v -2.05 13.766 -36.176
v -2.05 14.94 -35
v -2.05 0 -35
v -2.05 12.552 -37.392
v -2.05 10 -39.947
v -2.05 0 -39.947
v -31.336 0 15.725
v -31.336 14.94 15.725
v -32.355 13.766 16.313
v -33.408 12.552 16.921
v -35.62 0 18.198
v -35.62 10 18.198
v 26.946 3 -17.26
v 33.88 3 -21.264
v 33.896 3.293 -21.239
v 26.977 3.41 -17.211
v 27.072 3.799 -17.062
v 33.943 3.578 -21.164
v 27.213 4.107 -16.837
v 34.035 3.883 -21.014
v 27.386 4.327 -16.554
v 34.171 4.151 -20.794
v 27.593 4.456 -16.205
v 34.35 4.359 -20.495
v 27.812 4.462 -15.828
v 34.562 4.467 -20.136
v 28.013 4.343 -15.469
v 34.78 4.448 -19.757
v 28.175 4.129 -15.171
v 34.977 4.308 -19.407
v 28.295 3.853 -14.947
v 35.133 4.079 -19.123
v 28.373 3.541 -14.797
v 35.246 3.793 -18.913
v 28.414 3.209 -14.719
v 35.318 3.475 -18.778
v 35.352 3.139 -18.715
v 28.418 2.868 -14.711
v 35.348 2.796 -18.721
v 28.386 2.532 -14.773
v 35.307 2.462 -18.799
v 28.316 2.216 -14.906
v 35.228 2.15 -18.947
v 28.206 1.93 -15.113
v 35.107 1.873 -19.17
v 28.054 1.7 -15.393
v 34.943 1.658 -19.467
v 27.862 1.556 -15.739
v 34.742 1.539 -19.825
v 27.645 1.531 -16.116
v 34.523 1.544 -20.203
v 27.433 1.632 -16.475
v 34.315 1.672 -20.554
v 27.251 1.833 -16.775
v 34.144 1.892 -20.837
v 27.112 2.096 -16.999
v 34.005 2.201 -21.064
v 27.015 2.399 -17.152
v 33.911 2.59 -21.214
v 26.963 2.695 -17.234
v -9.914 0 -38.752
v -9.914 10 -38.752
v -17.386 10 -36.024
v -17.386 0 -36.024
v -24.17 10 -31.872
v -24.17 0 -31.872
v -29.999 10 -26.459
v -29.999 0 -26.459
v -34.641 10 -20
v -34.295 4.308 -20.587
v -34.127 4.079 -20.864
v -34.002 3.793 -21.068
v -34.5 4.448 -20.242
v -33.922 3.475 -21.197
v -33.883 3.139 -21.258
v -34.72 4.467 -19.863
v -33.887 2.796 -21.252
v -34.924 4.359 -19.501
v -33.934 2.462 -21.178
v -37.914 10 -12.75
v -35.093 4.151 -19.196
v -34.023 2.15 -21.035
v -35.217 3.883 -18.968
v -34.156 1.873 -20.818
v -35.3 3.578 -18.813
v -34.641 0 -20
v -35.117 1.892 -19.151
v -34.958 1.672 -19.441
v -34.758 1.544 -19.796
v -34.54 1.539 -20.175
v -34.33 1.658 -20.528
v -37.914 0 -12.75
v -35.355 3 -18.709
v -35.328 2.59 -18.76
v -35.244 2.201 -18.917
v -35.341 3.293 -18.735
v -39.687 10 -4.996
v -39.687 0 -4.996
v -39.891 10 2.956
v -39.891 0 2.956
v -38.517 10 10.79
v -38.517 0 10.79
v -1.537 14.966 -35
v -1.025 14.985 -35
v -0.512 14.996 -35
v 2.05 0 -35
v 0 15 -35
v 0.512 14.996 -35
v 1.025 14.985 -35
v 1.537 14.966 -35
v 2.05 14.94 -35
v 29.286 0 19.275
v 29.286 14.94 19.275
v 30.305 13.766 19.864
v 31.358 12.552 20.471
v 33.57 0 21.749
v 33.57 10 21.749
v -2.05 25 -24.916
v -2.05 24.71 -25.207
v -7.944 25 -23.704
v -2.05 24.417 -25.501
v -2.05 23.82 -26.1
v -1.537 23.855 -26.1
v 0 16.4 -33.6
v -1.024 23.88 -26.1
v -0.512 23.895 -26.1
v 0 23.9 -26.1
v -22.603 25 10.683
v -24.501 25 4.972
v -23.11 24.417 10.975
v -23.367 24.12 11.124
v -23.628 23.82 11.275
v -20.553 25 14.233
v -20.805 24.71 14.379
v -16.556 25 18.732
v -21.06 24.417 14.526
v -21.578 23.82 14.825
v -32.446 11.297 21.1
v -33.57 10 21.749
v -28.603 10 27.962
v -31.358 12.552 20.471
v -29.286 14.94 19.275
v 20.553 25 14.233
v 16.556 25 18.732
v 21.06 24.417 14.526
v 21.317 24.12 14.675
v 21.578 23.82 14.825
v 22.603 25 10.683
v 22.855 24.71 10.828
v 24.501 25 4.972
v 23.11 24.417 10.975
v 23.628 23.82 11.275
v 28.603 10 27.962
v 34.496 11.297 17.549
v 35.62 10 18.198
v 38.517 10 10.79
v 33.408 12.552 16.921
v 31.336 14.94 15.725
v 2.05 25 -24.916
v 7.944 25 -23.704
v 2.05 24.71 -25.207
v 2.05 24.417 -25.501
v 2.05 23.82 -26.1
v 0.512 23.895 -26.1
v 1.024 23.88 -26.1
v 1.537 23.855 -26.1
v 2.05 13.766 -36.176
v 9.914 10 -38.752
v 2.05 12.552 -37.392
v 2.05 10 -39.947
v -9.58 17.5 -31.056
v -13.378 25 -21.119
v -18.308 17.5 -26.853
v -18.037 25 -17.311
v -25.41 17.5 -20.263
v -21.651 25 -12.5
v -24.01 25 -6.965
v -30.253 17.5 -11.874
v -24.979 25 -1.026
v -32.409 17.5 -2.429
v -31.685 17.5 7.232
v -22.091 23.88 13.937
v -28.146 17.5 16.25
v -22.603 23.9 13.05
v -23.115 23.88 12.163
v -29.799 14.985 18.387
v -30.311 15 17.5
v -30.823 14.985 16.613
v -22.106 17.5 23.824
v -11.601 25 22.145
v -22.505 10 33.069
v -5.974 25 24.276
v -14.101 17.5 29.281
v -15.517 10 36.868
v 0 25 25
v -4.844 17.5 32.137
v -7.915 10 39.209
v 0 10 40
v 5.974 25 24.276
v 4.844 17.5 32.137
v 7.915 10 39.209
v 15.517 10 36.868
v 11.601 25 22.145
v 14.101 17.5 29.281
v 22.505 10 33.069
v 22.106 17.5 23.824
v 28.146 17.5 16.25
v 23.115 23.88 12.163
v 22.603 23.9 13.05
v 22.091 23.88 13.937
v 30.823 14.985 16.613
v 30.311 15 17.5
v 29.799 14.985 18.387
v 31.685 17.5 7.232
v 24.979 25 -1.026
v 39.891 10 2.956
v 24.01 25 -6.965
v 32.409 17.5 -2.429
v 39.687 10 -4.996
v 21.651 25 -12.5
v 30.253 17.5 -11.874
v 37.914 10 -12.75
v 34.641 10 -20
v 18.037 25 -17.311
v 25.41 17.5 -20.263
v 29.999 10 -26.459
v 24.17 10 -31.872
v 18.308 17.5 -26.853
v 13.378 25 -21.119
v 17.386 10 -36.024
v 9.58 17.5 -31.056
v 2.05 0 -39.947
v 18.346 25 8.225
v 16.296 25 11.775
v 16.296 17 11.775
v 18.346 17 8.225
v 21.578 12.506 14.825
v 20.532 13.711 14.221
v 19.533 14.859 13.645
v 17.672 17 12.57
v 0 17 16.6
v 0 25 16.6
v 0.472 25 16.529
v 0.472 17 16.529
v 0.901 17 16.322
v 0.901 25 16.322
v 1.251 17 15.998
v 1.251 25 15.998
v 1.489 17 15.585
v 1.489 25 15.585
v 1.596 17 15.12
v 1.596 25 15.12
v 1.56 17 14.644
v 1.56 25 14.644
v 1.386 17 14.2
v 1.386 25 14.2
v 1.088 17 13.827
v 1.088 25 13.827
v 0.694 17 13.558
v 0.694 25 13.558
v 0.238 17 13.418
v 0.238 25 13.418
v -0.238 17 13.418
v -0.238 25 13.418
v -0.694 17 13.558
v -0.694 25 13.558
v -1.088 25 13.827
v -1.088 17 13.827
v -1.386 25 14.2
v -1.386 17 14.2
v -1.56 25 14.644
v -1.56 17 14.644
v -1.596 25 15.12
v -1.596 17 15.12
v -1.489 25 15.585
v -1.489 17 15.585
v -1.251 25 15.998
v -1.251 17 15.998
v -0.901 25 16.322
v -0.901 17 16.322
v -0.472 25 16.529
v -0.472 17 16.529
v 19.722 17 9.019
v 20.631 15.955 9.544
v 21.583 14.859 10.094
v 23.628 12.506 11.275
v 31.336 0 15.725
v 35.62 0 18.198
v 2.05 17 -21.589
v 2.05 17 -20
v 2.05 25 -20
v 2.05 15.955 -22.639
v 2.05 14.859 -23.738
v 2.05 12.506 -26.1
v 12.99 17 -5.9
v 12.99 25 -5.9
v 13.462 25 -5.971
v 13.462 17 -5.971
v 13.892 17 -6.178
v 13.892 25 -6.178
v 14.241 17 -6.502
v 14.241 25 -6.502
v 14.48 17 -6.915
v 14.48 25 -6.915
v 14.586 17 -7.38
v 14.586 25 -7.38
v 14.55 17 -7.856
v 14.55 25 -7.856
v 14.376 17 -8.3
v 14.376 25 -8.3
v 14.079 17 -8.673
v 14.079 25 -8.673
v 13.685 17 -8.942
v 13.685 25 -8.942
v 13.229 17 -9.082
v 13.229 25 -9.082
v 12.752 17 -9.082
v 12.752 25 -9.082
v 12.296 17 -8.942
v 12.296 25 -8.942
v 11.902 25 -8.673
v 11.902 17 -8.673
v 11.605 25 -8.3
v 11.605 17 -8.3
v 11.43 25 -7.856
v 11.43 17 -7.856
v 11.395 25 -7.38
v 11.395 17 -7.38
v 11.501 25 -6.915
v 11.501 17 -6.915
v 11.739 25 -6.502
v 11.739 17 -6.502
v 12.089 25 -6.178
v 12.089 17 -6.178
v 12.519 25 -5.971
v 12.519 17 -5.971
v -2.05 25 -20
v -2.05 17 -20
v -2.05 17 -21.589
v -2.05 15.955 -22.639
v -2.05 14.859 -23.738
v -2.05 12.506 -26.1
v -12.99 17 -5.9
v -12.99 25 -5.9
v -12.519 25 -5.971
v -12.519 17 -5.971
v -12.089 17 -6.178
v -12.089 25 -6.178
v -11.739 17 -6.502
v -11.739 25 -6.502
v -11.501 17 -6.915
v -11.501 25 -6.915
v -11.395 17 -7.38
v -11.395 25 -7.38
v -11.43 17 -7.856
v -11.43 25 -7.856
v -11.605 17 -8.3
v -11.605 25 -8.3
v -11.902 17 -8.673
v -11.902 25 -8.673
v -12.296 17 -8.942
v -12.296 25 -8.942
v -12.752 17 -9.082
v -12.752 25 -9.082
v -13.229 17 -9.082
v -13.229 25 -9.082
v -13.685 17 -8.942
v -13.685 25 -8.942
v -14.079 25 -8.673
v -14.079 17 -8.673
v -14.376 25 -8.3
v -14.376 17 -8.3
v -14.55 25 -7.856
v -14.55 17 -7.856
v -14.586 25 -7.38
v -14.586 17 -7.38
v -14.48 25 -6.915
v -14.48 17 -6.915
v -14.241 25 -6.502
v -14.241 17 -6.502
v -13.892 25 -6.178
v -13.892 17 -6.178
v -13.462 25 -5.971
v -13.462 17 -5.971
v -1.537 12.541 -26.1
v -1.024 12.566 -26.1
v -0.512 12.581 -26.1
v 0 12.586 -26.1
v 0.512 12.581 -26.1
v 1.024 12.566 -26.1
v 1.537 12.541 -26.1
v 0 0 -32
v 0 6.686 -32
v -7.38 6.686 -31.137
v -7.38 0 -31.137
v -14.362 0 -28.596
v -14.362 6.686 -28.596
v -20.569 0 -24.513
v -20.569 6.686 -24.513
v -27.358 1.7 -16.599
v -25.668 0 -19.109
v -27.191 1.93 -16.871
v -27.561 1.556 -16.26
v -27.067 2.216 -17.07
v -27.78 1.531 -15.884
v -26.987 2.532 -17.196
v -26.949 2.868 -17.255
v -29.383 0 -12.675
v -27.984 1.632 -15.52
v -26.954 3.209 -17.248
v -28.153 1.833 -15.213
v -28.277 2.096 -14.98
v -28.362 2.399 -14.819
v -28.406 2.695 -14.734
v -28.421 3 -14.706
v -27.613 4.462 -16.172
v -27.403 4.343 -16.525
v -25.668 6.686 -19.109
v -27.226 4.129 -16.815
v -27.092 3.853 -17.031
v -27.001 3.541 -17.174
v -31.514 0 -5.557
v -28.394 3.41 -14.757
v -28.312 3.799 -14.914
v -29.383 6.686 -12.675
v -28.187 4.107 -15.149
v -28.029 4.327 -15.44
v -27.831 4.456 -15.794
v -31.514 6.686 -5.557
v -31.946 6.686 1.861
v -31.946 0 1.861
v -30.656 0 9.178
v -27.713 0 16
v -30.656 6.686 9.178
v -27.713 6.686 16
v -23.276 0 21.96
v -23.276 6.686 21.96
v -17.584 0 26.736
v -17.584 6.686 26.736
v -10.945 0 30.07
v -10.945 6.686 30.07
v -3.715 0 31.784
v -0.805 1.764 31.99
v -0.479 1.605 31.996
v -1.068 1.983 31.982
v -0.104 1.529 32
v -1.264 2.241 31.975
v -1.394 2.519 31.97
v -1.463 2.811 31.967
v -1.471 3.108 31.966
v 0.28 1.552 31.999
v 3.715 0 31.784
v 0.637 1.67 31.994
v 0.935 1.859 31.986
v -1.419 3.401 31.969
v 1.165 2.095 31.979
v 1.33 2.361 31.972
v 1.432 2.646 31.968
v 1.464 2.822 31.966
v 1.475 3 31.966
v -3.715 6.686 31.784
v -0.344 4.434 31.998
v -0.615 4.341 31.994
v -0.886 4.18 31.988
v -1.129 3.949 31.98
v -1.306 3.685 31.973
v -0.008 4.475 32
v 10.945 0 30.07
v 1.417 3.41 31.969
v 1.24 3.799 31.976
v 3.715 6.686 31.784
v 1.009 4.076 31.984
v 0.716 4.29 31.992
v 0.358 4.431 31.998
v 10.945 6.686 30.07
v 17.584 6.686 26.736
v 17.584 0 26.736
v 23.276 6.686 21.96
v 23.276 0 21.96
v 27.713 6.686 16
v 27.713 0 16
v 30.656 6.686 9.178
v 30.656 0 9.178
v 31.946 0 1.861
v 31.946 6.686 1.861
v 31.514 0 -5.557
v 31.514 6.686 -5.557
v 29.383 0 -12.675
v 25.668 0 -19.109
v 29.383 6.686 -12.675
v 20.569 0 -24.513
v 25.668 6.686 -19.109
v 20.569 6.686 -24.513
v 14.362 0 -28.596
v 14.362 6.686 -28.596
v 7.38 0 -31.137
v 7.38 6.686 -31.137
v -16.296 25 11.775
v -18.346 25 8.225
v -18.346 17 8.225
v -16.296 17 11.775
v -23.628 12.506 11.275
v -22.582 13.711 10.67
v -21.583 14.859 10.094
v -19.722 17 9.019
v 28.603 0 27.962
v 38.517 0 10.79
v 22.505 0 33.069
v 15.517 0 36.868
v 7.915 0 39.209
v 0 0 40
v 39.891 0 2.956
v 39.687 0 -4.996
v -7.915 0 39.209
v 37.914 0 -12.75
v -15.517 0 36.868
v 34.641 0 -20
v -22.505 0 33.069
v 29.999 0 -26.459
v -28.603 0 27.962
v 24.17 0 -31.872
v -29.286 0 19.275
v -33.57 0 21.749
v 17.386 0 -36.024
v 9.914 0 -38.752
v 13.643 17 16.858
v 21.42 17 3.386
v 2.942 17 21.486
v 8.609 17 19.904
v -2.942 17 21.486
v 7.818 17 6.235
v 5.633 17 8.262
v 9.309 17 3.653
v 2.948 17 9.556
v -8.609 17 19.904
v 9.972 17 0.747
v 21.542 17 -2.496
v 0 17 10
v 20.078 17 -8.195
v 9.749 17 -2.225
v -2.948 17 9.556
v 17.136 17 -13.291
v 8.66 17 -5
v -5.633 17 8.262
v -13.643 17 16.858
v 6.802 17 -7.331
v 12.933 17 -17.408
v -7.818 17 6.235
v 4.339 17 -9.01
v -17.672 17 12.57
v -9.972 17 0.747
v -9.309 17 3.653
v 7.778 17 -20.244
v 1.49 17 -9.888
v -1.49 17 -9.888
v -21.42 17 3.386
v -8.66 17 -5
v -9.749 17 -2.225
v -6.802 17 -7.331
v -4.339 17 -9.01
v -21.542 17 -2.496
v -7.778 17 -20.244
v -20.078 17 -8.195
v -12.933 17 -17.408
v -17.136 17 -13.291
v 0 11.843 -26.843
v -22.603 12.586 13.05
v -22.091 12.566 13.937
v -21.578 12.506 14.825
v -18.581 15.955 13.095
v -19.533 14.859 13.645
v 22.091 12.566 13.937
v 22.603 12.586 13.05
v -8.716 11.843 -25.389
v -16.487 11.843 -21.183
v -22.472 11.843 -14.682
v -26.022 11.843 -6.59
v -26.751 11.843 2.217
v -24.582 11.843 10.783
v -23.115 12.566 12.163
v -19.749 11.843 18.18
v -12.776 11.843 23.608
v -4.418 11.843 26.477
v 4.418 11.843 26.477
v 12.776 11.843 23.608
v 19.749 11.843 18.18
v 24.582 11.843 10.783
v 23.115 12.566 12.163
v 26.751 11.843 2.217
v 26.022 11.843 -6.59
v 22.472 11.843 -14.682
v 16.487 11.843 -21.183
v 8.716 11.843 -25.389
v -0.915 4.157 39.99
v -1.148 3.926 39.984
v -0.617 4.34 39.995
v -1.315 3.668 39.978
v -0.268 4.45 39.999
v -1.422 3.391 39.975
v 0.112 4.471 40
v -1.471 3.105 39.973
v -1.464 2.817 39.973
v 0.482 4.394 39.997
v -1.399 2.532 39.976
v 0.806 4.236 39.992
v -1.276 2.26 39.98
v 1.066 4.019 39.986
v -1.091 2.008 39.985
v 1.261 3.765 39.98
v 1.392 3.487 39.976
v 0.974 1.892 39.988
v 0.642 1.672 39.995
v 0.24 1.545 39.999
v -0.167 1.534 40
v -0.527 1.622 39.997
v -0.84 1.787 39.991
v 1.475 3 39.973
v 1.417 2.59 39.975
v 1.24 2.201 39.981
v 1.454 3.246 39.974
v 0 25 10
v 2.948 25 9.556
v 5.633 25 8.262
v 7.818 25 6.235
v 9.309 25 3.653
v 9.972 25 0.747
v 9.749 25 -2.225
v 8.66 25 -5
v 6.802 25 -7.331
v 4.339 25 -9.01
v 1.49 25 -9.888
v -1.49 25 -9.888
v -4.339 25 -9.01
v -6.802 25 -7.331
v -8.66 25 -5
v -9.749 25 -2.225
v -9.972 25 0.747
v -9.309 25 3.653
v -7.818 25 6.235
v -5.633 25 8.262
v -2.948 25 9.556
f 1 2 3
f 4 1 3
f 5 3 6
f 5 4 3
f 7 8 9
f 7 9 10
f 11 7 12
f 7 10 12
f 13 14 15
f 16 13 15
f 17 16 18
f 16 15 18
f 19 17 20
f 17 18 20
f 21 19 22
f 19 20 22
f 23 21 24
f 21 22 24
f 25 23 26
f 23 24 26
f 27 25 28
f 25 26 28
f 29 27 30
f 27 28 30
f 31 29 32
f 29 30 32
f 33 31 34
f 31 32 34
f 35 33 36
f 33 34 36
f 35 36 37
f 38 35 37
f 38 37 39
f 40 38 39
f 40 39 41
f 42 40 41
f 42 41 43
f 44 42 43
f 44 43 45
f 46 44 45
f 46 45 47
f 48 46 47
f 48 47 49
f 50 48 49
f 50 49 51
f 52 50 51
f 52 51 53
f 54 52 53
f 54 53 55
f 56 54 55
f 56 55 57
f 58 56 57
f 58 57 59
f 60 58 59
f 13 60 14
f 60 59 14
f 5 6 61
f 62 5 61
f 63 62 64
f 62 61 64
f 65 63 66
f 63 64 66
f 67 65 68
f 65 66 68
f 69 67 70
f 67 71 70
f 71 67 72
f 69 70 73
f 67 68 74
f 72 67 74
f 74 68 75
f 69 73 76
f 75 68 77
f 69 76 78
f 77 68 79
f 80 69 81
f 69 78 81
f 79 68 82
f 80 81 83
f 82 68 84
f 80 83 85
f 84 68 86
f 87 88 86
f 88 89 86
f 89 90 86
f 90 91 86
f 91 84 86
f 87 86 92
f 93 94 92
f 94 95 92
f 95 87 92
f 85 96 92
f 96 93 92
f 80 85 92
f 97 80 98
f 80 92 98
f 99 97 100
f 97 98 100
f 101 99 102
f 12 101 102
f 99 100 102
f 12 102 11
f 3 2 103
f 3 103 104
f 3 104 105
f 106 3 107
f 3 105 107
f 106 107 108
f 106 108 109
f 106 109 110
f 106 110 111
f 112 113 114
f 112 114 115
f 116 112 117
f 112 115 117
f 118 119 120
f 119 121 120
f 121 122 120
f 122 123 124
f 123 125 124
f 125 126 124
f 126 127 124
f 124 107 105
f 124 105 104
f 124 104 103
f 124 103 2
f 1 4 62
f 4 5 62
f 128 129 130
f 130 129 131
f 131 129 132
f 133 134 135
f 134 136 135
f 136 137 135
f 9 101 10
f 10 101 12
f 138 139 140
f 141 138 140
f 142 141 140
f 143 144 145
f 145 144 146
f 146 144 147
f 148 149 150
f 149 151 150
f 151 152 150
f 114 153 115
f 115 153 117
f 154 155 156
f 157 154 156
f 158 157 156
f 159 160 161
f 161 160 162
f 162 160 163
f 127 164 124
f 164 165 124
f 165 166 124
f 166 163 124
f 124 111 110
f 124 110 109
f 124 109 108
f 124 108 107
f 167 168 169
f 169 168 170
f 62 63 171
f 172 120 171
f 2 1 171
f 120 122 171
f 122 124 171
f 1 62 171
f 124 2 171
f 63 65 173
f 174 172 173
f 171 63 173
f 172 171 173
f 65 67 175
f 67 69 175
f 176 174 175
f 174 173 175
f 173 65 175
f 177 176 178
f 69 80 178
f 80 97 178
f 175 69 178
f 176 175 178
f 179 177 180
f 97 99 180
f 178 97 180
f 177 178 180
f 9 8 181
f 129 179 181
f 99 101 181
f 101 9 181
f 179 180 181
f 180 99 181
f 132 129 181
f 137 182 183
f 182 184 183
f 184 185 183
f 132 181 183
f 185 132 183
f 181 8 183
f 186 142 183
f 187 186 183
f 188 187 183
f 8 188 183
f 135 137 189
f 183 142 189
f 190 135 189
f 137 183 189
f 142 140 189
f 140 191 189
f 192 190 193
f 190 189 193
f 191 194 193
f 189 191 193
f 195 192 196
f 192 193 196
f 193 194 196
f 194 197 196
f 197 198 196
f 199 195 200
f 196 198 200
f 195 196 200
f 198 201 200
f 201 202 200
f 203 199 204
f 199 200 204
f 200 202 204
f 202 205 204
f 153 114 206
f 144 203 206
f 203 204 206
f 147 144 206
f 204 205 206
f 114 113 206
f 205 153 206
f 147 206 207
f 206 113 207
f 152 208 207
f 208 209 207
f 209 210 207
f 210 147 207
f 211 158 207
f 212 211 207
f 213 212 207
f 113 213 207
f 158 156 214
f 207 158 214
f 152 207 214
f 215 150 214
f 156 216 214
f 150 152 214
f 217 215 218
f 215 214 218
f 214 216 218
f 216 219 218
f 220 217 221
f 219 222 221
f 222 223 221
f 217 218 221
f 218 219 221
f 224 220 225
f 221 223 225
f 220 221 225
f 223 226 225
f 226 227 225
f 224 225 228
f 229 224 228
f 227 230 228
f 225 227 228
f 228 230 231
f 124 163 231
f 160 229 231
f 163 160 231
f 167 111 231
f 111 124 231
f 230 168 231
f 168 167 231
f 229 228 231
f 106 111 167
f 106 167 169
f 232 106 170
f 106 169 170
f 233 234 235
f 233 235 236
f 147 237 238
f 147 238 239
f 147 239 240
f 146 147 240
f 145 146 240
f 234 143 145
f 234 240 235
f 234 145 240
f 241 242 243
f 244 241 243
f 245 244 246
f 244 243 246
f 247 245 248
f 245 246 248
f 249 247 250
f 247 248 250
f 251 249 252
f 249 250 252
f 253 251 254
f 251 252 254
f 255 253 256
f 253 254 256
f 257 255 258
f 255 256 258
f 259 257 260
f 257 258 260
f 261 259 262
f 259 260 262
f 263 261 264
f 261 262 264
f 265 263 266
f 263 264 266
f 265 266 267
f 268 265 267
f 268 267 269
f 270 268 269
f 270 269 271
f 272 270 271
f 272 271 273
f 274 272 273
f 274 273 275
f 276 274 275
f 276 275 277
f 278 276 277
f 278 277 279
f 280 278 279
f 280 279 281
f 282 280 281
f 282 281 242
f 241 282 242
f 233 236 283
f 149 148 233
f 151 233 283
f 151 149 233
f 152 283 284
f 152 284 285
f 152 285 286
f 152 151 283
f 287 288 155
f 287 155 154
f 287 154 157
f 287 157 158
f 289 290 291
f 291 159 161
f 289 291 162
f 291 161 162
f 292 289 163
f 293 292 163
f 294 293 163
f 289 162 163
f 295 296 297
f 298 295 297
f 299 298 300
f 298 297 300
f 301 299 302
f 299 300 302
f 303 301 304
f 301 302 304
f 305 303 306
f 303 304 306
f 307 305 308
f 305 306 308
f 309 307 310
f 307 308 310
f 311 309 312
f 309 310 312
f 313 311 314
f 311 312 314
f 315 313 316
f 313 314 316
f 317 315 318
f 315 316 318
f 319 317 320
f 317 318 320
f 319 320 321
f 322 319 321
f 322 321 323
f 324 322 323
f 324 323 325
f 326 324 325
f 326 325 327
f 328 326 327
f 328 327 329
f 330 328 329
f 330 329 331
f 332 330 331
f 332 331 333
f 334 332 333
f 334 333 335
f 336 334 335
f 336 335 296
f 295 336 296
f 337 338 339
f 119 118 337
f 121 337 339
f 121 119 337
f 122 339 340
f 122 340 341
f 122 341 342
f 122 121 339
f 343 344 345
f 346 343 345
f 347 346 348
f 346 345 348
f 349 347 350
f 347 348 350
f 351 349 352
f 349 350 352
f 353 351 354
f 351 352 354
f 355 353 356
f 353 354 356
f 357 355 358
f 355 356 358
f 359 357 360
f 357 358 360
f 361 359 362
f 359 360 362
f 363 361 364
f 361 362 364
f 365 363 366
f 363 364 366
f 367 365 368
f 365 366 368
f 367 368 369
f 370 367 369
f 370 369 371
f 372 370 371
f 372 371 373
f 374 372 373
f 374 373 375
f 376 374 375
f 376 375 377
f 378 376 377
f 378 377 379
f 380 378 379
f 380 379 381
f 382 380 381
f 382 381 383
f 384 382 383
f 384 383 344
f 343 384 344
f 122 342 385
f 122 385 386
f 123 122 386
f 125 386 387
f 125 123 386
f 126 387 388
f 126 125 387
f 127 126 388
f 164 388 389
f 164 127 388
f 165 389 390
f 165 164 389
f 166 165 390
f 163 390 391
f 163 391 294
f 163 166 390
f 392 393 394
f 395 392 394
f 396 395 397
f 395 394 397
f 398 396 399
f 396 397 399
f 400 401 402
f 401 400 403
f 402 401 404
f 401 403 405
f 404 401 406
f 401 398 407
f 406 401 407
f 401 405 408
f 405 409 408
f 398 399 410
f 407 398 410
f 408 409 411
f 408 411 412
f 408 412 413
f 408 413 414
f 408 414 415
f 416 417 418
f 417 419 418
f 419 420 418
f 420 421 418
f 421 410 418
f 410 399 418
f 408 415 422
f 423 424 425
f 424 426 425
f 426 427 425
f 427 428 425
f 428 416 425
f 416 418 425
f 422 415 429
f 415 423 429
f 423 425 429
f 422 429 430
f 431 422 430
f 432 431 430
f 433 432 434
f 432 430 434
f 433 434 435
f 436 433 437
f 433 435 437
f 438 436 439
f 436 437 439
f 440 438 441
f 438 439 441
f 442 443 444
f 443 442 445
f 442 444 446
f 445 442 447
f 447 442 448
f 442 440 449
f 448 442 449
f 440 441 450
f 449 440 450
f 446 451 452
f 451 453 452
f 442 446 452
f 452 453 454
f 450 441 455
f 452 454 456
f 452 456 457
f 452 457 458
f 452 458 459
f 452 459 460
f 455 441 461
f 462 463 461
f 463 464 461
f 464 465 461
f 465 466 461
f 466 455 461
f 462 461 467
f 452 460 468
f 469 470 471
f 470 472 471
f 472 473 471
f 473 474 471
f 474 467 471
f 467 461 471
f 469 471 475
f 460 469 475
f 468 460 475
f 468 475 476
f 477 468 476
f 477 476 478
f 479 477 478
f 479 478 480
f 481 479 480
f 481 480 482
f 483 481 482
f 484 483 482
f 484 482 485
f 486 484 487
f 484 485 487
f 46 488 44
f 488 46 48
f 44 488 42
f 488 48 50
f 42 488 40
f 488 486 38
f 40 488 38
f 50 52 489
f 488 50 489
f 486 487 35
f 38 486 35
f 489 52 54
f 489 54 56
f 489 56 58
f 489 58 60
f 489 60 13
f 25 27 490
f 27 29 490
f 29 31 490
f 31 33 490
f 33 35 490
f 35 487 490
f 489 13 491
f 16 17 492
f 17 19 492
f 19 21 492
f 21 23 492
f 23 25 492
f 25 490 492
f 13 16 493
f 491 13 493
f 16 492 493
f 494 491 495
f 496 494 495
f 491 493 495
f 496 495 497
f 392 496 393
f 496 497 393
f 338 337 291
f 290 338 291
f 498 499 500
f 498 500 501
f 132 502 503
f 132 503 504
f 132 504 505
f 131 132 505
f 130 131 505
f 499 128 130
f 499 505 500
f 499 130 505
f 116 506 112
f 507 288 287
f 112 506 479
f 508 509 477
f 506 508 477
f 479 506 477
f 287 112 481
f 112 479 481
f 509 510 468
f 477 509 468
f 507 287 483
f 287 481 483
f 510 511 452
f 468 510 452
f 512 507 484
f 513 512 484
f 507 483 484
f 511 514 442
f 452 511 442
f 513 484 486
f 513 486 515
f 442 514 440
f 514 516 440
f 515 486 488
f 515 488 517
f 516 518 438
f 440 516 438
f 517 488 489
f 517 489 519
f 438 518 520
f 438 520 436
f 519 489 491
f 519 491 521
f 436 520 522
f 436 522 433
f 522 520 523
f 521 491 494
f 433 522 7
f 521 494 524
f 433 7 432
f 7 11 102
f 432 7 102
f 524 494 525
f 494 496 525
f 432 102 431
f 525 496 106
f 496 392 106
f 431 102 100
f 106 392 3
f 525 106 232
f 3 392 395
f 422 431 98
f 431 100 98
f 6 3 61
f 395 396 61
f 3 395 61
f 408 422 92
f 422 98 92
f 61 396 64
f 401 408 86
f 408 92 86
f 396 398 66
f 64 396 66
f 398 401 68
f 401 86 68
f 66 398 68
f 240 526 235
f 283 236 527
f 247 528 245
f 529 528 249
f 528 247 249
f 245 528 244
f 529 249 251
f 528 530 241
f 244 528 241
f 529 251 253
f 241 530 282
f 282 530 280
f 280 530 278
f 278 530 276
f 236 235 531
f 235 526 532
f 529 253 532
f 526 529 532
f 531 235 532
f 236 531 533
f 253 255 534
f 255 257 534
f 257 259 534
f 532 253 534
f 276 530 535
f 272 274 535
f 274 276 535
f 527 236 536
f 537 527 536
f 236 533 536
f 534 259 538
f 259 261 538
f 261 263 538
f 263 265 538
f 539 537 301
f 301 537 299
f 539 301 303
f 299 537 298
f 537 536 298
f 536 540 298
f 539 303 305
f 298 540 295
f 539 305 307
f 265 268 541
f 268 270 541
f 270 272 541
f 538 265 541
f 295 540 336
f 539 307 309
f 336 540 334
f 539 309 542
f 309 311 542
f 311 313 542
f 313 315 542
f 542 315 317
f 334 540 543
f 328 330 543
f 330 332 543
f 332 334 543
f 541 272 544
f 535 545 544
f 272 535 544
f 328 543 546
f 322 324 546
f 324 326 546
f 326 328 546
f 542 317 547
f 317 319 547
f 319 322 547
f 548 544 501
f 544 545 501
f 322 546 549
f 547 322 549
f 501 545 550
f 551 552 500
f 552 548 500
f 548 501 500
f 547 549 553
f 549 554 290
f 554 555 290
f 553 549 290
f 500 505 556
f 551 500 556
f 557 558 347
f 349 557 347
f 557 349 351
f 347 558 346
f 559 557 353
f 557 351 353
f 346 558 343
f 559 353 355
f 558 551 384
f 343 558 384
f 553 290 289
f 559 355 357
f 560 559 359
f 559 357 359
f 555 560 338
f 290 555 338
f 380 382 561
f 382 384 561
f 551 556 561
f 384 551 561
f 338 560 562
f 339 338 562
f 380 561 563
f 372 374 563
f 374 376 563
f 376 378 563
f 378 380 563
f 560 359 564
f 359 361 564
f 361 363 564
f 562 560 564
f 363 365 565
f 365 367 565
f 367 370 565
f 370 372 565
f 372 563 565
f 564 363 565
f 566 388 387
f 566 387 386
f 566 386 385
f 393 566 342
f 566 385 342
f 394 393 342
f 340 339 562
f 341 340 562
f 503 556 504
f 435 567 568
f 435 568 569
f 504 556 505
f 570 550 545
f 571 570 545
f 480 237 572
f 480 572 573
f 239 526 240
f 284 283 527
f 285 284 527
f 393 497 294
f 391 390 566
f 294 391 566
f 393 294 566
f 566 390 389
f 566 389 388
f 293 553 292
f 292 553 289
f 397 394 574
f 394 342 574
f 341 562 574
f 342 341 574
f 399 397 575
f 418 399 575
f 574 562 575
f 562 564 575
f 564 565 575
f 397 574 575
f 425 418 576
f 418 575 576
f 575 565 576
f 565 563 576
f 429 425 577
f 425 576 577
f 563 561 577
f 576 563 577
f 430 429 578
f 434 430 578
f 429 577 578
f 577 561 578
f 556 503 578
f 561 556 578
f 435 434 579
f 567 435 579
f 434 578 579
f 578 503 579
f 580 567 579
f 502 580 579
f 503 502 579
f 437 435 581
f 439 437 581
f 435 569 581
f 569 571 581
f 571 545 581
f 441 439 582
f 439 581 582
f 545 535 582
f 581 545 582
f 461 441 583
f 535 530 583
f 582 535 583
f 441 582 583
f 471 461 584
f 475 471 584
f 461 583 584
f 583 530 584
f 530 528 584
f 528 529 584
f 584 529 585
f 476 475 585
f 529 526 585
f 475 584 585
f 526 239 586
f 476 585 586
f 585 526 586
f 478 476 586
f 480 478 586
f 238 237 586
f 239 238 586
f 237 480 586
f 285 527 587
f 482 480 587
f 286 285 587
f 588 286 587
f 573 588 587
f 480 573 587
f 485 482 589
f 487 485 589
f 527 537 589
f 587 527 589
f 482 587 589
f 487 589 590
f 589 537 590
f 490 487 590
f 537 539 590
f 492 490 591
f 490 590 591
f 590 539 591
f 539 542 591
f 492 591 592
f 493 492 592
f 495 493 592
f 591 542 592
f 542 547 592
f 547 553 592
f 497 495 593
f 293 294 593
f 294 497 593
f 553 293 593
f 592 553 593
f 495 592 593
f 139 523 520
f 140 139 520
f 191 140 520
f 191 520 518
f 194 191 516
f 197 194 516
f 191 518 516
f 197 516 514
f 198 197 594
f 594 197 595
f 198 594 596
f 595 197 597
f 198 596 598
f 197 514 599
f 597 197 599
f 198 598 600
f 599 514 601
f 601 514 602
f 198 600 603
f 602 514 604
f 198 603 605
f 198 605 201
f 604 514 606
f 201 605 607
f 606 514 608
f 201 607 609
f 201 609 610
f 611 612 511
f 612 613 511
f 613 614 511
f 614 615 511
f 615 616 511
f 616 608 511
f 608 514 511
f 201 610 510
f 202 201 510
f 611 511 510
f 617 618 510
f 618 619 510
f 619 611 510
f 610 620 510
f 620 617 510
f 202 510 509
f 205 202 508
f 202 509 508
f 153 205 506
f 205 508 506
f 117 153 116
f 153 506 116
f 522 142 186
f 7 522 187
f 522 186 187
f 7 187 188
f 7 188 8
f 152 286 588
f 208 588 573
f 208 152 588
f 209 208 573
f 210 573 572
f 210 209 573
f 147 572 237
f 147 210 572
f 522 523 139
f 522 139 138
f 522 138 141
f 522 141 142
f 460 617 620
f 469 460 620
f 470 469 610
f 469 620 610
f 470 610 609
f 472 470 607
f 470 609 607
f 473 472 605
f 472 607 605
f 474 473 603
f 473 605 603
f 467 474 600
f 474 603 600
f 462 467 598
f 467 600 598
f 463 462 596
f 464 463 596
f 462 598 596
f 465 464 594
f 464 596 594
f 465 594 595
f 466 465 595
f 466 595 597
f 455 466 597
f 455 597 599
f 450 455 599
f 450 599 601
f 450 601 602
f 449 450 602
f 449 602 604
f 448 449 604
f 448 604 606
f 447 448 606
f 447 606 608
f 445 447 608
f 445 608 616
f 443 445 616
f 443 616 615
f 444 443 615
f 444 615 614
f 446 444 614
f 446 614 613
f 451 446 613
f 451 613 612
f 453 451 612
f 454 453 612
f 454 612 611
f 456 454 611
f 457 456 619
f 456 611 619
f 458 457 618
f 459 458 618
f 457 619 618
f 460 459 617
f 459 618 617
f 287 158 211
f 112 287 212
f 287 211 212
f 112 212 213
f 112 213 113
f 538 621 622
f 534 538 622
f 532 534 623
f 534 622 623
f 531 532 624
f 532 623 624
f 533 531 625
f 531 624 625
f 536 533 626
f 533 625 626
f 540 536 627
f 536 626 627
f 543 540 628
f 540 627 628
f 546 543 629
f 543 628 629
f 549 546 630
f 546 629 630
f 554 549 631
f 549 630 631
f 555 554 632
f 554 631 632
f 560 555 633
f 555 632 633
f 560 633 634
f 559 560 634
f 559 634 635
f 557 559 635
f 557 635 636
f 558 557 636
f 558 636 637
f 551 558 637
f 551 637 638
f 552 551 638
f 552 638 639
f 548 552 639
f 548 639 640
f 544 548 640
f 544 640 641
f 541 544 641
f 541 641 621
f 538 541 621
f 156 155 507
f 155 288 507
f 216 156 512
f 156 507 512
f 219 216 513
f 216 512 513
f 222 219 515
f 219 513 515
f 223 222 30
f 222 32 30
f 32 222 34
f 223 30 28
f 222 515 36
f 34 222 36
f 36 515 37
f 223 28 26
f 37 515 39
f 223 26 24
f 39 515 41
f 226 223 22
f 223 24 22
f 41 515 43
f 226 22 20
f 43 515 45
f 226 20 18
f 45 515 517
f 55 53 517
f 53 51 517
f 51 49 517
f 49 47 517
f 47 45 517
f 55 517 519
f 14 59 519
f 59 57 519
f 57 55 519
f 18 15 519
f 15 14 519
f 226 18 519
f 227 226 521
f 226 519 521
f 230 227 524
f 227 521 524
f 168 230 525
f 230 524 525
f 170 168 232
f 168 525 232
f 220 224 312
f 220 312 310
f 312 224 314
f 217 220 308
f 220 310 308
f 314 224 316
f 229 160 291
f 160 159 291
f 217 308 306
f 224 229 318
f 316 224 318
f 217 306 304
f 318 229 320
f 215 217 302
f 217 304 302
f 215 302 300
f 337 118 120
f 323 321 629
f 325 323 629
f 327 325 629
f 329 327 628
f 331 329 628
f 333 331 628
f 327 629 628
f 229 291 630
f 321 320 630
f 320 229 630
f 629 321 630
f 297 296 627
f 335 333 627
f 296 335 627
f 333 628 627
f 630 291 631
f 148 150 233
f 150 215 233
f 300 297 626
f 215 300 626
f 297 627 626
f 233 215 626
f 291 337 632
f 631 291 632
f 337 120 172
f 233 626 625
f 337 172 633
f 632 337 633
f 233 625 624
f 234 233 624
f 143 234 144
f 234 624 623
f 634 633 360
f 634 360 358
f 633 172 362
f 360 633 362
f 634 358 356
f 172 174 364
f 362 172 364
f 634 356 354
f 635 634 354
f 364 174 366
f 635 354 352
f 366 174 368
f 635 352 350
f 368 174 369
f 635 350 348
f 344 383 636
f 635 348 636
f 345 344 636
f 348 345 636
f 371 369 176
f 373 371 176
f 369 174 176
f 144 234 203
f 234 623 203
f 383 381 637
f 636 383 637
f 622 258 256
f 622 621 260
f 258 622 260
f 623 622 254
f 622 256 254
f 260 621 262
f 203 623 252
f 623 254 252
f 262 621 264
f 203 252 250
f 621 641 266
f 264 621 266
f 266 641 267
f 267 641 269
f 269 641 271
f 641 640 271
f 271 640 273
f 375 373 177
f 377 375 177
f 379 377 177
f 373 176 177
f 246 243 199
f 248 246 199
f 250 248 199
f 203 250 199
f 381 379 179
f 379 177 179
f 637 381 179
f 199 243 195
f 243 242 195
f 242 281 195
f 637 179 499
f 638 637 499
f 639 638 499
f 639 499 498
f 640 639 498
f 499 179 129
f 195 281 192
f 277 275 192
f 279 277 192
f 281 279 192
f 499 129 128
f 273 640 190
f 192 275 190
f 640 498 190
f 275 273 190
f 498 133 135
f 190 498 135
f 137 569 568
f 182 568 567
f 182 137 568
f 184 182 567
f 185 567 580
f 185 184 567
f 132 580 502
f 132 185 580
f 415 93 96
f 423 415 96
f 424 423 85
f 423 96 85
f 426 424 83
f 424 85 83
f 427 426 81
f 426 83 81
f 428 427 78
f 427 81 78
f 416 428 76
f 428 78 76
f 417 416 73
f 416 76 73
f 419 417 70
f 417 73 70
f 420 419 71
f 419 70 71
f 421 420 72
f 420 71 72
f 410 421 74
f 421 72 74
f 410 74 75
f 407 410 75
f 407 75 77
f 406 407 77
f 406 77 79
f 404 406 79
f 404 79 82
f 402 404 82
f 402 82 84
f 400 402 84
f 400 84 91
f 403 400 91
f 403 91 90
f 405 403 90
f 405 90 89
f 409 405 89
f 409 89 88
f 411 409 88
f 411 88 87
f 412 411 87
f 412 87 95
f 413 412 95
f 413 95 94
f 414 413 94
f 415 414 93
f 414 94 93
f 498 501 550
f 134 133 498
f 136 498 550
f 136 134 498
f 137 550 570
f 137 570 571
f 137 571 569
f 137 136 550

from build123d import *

# Parameters (mm, degrees)
SKETCH_2_R               = 10
SKETCH_2_R_2             = 1.6
SKETCH_2_W               = 4.1
SKETCH_2_H               = 6.1
CUT_EXTRUDE_1_DEPTH      = 42
SKETCH_3_R               = 1.475
CUT_EXTRUDE_2_DEPTH      = 15
PATTERN_CIRCULAR_1_COUNT = 3


with BuildPart() as part:
    # 草图1 → 旋转1 (revolve)
    with BuildSketch(Plane(origin=(0, 0, 0), x_dir=(0, 0, -1), z_dir=(1, 0, 0)), mode=Mode.PRIVATE) as revolve_1_sk:
        Polygon((0, 25), (-25, 25), (-40, 10), (-40, 0), (-32, 0), (-32, 6.686291501), (-21.686291501, 17), (0, 17), align=None)
    revolve(revolve_1_sk.sketch.rotate(Axis((0, 0, 0), (0, 1, 0)), 180), axis=Axis((0, 0, 0), (0, 1, 0)))

    # 草图2 → 切除-拉伸1 (cut)
    with BuildSketch(Plane(origin=(0, 25, 0), x_dir=(1, 0, 0), z_dir=(0, 1, 0))):
        with Locations(Location((0, 0, 0), (0, 0, 270))):
            Circle(SKETCH_2_R)
        with Locations(Location((12.990381057, 7.5, 0), (0, 0, 270))):
            Circle(SKETCH_2_R_2)
        with Locations(Location((0, -15, 0), (0, 0, 270))):
            Circle(SKETCH_2_R_2)
        with Locations(Location((-12.990381057, 7.5, 0), (0, 0, 270))):
            Circle(SKETCH_2_R_2)
        Polygon((36.618644096, -18.774647922), (31.335889132, -15.724647922), (29.285889132, -19.275352078), (34.568644096, -22.325352078), align=None)
        with Locations((0, 23.05)):
            Rectangle(SKETCH_2_W, SKETCH_2_H)
        with Locations((0, 38.05)):
            Rectangle(SKETCH_2_W, SKETCH_2_H)
        Polygon((18.345508076, -8.224647922), (23.628263039, -11.274647922), (21.578263039, -14.825352078), (16.295508076, -11.775352078), align=None)
        Polygon((-34.568644096, -22.325352078), (-29.285889132, -19.275352078), (-31.335889132, -15.724647922), (-36.618644096, -18.774647922), align=None)
        Polygon((-16.295508076, -11.775352078), (-21.578263039, -14.825352078), (-23.628263039, -11.274647922), (-18.345508076, -8.224647922), align=None)
    extrude(amount=-CUT_EXTRUDE_1_DEPTH, mode=Mode.SUBTRACT)

    # 草图3 → 切除-拉伸2 (cut)
    with BuildSketch(Plane.XY.offset(40)):
        with Locations((0, 3)):
            Circle(SKETCH_3_R)
    cut_extrude_2 = extrude(amount=-CUT_EXTRUDE_2_DEPTH, mode=Mode.SUBTRACT)

    # 阵列(圆周)1: 切除-拉伸2 ×3 about axis
    pattern_circular_1_axis = Axis((0, 10, 0), (0, -1, 0))
    for i in range(1, PATTERN_CIRCULAR_1_COUNT):
        add(cut_extrude_2.rotate(pattern_circular_1_axis, i * 360 / PATTERN_CIRCULAR_1_COUNT), mode=Mode.SUBTRACT)


solid = part.part
